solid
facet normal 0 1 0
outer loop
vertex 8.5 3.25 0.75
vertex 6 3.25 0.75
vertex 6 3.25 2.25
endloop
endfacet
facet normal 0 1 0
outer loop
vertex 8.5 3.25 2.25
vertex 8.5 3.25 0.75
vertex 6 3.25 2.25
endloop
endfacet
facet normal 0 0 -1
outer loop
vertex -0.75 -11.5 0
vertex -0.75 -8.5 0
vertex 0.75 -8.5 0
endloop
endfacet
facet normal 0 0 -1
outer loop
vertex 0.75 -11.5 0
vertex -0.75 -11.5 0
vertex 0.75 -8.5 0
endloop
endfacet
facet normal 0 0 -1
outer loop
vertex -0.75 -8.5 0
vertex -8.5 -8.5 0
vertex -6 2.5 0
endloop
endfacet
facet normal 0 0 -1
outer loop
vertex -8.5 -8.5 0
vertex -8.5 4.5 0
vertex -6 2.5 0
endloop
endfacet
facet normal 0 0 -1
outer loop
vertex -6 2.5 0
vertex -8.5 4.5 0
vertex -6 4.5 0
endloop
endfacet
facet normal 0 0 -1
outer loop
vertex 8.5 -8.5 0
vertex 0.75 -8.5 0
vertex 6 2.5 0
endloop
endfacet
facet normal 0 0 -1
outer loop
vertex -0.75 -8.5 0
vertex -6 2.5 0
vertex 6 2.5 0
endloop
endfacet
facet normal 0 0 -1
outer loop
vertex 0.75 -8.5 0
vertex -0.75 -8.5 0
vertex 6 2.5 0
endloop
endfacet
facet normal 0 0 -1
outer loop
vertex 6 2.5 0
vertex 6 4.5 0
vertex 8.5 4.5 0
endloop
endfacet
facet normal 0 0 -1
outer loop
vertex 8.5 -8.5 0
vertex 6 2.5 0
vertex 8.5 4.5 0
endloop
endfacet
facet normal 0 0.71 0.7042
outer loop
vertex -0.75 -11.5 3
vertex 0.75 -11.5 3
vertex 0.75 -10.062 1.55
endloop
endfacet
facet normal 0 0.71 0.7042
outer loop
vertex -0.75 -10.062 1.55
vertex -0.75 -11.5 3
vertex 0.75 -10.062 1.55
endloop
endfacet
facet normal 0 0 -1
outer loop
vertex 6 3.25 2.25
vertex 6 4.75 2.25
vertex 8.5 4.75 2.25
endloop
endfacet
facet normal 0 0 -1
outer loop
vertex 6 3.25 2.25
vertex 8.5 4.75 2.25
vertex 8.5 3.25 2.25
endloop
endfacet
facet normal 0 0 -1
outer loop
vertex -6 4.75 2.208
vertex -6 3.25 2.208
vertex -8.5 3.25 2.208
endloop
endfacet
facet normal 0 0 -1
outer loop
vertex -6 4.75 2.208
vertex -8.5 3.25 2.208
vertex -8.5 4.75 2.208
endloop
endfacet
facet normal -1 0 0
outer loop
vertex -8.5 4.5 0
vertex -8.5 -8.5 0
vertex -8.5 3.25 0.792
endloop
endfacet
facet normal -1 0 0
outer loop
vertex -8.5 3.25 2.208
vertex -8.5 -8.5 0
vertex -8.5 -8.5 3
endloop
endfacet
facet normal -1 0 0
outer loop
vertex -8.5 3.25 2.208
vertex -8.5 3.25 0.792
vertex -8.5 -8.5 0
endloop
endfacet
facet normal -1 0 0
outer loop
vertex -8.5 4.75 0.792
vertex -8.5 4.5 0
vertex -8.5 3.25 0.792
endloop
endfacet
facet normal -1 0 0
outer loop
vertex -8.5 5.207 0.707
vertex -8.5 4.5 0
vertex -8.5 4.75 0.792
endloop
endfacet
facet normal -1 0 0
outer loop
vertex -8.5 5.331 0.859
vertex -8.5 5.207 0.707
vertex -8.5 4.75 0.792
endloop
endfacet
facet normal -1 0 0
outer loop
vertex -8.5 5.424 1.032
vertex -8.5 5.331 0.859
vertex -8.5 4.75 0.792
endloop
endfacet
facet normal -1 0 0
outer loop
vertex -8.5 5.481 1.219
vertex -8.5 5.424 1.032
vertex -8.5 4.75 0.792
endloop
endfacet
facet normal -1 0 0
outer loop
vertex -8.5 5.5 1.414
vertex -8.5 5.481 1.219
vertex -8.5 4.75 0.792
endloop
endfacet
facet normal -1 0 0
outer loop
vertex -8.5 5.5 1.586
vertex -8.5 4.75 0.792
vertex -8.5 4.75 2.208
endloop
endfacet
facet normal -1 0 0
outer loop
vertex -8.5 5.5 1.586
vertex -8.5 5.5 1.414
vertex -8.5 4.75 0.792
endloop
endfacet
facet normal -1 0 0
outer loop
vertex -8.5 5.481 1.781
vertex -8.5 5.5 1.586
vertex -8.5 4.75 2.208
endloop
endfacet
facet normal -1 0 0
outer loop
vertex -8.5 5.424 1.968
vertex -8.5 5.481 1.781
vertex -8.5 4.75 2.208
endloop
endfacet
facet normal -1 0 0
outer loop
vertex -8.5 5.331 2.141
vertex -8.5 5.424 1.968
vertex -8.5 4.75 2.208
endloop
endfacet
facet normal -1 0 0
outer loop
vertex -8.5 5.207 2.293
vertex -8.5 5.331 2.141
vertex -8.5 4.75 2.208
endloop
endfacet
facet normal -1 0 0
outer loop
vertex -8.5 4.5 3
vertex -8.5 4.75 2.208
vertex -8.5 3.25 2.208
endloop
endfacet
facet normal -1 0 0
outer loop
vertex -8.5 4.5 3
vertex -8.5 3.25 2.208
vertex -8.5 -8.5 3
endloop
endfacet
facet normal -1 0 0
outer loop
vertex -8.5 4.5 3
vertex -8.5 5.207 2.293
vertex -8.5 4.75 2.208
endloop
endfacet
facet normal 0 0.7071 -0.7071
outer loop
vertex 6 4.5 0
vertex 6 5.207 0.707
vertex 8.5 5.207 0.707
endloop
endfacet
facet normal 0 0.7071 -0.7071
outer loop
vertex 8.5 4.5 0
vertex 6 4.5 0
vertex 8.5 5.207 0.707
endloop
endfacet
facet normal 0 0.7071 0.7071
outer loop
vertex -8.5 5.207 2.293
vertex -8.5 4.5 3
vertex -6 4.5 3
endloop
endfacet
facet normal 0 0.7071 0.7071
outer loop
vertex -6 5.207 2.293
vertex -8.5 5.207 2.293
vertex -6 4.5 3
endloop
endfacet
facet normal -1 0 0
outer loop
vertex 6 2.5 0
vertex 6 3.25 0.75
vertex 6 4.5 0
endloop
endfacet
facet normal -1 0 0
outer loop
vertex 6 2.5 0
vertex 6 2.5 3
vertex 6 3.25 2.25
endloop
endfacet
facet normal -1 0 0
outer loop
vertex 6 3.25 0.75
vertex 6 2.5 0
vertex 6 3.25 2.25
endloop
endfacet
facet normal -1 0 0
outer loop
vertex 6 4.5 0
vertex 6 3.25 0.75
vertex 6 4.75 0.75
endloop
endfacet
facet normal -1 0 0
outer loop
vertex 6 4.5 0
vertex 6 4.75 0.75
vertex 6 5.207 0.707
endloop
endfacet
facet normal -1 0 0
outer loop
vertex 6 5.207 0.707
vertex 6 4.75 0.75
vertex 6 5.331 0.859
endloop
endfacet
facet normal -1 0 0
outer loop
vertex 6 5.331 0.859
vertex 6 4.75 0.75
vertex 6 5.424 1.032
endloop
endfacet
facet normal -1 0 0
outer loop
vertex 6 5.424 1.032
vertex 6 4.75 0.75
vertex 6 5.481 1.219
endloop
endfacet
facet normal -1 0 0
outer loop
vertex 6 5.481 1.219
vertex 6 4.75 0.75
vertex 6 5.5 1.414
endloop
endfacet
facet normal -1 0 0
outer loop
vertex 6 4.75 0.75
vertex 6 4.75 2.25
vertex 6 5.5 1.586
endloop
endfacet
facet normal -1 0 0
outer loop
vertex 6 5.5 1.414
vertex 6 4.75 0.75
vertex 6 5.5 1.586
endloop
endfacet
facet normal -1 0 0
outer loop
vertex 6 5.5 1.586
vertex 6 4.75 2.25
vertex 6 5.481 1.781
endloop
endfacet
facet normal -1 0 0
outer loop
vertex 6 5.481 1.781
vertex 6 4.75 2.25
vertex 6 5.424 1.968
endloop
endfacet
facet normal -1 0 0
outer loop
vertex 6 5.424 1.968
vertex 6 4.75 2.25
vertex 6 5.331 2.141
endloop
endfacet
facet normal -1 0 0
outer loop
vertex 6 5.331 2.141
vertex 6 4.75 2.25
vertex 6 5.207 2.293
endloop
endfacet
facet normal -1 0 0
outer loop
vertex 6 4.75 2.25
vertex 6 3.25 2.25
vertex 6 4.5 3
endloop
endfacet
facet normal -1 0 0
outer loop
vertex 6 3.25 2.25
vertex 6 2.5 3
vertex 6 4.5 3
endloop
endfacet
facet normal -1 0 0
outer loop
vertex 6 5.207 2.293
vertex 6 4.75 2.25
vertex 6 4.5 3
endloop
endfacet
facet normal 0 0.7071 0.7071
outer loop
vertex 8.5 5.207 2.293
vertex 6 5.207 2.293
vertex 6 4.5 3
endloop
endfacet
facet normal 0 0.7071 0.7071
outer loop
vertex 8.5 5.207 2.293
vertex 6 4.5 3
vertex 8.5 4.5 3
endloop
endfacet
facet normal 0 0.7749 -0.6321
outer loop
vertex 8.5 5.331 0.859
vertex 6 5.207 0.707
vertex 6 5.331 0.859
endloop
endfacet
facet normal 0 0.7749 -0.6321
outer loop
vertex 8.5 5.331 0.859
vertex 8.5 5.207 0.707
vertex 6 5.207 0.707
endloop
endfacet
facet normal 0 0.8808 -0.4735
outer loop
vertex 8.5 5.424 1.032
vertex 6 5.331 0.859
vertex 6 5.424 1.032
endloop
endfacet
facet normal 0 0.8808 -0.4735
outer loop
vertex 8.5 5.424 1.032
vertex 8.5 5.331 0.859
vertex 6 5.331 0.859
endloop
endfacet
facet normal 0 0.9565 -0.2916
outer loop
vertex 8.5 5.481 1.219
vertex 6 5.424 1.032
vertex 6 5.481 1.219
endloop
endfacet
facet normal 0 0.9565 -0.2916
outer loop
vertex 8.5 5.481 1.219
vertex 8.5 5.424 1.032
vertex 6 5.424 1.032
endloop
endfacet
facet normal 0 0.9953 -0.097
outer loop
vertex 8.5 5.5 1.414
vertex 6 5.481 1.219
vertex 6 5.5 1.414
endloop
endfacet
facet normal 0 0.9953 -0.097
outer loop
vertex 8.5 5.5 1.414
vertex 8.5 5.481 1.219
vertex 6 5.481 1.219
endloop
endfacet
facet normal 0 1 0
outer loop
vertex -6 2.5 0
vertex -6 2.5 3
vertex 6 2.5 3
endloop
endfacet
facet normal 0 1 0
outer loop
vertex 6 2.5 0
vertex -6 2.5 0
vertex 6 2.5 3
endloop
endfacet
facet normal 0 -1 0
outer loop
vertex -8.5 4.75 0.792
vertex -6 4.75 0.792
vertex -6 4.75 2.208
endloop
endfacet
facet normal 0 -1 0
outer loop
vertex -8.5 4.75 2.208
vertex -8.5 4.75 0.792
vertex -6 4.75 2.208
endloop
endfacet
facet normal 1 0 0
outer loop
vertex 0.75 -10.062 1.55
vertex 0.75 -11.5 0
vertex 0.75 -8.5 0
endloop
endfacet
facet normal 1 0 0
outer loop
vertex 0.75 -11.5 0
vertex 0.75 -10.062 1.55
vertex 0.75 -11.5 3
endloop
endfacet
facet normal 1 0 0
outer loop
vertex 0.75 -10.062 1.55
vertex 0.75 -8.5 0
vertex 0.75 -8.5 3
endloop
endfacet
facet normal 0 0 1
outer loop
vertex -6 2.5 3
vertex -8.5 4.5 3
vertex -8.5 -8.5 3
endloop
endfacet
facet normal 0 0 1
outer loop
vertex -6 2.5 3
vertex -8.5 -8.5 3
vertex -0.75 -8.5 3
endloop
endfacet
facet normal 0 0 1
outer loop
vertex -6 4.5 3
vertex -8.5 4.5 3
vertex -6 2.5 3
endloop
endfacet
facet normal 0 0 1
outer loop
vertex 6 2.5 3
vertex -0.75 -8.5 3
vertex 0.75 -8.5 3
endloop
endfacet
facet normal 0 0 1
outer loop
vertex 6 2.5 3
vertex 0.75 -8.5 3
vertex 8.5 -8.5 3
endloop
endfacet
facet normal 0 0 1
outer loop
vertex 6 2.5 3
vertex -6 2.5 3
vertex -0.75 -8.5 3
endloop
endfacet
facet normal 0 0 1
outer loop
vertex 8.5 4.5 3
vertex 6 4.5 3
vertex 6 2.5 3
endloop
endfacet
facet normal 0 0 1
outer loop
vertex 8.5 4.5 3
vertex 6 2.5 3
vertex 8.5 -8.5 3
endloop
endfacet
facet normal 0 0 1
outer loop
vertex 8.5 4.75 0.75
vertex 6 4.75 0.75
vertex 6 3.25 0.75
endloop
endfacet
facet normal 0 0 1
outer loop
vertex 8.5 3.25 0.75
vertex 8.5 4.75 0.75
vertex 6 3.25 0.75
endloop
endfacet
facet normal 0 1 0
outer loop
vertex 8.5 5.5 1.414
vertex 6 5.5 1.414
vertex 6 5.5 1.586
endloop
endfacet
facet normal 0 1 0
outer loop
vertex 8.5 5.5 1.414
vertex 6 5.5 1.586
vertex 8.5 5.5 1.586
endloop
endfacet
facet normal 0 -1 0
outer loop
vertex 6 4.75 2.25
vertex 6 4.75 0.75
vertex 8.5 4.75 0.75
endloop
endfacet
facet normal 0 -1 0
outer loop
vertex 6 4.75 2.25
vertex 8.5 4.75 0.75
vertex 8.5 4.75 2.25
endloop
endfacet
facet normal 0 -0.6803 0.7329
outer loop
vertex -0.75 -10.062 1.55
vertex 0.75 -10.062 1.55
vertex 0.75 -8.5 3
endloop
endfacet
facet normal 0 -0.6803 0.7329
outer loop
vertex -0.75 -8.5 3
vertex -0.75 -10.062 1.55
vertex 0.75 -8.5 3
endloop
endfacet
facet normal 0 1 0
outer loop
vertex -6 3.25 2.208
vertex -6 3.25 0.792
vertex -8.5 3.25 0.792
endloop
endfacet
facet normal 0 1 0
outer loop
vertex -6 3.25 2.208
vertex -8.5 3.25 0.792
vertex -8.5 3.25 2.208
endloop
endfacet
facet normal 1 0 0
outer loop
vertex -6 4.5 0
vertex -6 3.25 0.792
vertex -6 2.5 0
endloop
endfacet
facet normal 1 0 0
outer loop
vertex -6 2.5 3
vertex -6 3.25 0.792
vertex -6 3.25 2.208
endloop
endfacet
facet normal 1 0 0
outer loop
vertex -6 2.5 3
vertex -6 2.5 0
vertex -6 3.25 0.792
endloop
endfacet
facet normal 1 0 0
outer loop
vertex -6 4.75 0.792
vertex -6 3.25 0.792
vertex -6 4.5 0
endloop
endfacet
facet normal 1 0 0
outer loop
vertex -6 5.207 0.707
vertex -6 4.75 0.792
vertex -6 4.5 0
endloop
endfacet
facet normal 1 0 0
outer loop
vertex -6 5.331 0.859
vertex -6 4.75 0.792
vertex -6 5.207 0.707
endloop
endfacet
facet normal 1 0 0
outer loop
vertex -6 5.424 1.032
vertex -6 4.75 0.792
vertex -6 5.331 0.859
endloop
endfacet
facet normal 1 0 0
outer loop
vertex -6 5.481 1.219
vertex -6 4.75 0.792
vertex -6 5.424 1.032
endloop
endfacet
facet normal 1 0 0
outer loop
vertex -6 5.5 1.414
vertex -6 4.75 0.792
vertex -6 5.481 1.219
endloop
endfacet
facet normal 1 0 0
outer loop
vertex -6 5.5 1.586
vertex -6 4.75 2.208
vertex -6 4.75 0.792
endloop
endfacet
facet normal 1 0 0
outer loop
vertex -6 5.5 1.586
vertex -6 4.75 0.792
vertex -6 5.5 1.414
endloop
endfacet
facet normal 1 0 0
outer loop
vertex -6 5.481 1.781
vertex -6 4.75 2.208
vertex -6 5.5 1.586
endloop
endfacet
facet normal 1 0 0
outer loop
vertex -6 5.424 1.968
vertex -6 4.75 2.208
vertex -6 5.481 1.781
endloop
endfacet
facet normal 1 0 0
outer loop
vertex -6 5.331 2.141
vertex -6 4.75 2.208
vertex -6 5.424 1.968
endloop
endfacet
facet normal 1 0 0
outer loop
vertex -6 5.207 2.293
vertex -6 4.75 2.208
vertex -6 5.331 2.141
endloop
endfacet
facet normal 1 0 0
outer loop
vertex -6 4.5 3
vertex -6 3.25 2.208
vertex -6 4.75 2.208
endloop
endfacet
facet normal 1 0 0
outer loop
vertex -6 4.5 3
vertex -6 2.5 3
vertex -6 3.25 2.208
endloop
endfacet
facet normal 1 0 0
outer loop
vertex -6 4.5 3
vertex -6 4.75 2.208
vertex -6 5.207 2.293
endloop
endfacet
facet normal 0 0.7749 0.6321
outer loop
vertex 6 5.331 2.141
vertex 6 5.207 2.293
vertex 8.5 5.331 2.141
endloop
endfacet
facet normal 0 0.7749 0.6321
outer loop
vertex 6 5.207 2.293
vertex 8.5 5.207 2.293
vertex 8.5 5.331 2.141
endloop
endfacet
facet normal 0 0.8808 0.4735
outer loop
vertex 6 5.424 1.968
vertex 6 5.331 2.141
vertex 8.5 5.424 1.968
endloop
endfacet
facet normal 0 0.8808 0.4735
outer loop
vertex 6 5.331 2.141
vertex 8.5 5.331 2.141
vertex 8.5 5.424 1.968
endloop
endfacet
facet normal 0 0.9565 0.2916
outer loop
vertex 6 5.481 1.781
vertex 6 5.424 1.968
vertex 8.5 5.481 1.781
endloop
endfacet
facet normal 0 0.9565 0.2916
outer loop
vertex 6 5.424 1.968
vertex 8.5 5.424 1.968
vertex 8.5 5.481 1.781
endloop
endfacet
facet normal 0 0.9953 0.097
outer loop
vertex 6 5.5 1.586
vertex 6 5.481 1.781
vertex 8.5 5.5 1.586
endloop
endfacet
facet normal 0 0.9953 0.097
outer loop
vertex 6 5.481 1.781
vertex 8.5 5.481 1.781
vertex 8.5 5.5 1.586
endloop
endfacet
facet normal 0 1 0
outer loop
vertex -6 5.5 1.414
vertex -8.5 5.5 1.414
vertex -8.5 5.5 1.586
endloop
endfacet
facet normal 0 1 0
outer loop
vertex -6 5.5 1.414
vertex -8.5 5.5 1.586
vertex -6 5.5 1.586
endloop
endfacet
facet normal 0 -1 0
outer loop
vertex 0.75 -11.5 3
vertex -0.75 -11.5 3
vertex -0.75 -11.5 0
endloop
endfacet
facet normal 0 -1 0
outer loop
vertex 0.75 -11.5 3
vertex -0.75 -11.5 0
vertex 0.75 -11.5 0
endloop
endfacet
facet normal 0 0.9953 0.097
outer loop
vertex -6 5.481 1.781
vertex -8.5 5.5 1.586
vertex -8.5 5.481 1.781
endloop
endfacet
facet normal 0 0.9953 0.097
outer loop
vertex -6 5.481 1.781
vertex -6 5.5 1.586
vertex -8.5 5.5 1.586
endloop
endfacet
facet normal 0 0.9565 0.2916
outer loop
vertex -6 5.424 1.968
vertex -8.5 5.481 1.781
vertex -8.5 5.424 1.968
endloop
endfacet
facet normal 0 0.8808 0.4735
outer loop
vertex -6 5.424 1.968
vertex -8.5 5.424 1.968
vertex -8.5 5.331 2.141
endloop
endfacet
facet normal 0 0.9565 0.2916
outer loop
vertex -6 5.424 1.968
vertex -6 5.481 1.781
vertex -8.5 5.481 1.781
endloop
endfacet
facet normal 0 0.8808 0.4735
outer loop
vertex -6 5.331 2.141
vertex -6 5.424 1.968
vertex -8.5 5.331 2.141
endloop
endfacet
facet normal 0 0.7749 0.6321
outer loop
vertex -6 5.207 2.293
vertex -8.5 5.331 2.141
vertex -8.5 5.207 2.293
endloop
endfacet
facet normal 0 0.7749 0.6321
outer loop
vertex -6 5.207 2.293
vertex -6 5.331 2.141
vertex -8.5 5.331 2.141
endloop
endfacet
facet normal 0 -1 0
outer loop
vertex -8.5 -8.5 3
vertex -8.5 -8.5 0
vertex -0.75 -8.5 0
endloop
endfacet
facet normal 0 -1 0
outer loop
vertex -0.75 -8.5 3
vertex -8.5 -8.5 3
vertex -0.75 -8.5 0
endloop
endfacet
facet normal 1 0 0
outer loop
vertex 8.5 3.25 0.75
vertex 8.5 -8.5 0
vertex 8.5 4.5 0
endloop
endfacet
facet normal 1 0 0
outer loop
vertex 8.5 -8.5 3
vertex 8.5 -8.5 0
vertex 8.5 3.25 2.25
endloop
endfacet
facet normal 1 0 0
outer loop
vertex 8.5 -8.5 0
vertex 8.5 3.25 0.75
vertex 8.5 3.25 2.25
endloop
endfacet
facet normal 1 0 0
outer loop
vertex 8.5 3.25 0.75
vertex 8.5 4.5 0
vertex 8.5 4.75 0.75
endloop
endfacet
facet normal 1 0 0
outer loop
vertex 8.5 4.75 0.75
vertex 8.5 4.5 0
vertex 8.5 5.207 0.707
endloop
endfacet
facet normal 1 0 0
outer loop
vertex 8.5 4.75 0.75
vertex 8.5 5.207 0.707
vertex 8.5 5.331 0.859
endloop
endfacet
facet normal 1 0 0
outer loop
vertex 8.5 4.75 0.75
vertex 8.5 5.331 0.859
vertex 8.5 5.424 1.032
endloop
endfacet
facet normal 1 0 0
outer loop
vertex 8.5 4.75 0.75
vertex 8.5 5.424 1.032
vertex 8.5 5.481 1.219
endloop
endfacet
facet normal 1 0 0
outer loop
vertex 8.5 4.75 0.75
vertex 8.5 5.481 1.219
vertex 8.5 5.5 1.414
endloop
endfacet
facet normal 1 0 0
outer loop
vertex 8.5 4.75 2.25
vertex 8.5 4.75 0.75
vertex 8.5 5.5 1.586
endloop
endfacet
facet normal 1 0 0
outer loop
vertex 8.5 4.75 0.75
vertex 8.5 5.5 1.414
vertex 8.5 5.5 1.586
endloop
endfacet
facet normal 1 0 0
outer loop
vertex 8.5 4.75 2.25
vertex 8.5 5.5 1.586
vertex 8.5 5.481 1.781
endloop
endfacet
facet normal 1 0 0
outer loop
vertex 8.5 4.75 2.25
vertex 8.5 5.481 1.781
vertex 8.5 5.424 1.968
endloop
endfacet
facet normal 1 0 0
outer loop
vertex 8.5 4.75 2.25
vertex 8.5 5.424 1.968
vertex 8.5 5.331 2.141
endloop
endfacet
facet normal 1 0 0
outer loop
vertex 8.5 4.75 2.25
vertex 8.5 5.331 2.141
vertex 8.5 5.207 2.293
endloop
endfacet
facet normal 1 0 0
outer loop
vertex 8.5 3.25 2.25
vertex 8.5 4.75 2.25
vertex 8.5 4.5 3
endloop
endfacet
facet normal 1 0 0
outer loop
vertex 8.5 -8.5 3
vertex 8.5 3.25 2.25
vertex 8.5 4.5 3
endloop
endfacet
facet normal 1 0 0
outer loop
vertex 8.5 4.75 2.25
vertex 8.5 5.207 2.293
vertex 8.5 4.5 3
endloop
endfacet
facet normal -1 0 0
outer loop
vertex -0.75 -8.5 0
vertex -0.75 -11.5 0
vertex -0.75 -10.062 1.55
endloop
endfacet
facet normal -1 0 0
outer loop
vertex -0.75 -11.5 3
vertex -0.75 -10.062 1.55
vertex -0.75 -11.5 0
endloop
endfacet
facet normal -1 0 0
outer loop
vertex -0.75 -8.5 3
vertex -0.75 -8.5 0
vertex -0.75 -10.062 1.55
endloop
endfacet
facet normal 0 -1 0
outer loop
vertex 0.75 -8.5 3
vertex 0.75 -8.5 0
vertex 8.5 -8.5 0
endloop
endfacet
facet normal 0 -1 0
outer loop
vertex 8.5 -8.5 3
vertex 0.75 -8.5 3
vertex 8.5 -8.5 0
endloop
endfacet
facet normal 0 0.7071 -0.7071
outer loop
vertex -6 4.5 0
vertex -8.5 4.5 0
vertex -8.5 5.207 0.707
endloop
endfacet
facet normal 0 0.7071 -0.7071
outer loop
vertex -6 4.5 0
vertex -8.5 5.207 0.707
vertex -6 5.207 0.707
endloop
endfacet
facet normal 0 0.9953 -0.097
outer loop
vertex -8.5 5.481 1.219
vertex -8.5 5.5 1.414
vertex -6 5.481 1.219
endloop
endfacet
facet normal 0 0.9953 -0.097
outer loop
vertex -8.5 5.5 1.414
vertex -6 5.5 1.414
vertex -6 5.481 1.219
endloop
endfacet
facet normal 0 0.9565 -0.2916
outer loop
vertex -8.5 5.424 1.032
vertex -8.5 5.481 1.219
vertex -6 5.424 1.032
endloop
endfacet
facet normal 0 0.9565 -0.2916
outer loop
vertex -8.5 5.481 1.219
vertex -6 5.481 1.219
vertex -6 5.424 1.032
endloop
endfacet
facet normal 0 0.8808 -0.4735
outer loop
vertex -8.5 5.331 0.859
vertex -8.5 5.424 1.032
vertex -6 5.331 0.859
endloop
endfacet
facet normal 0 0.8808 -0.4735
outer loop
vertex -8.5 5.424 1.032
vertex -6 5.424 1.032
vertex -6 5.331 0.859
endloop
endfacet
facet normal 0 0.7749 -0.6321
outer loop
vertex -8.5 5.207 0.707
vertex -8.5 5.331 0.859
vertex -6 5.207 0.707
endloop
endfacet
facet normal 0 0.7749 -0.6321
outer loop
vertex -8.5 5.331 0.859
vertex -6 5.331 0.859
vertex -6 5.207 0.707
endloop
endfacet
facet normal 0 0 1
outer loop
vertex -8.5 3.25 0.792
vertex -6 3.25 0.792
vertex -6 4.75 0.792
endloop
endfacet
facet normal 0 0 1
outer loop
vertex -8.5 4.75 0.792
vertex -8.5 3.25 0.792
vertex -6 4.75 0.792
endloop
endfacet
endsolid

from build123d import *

# Parameters (mm, degrees)
F0_W      = 17
F0_H      = 11
F1_DEPTH  = 3
F2_W      = 12
F2_H      = 3
F3_DEPTH  = 3.001
F4_W      = 1.5
F4_H      = 1.5
F5_DEPTH  = 100
F6_SIZE   = 1
F7_SIZE   = 1
F8_R      = 1
F9_DEPTH  = 3
F10_W     = 1.5
F10_H     = 3
F11_DEPTH = 3
F13_DEPTH = 9.251
F14_W     = 1.5
F14_H     = 1.416422517
F15_DEPTH = 25


with BuildPart() as f1:
    # F0 (on Top) → F1 (new body)
    with BuildSketch(Plane.XY):
        Rectangle(F0_W, F0_H)
    extrude(amount=F1_DEPTH)

    # F2 (on face) → F3 (cut, through all)
    with BuildSketch(Plane.XY.offset(3)):
        with Locations((0, 4)):
            Rectangle(F2_W, F2_H)
    extrude(amount=-F3_DEPTH, mode=Mode.SUBTRACT)

    # F4 (on face) → F5 (cut)
    with BuildSketch(Plane(origin=(6, 0, 0), x_dir=(0, -1, 0), z_dir=(-1, 0, 0))):
        with Locations((-4, 1.5)):
            Rectangle(F4_W, F4_H)
    extrude(amount=-F5_DEPTH, mode=Mode.SUBTRACT)

    # F6
    f6_edges = [f1.edges().sort_by_distance(p)[0] for p in [
        (-7.25, 5.5, 3),
        (7.25, 5.5, 3),
    ]]
    chamfer(f6_edges, length=F6_SIZE)

    # F7
    f7_edges = [f1.edges().sort_by_distance(p)[0] for p in [
        (-7.25, 5.5, 0),
        (7.25, 5.5, 0),
    ]]
    chamfer(f7_edges, length=F7_SIZE)

    # F8
    f8_edges = [f1.edges().sort_by_distance(p)[0] for p in [
        (-7.25, 5.5, 2),
        (7.25, 5.5, 2),
        (-7.25, 5.5, 1),
        (7.25, 5.5, 1),
    ]]
    fillet(f8_edges, radius=F8_R)

    # F9 (add): a face of the model
    f9_faces = [f1.faces().sort_by_distance(p)[0] for p in [
        (0, -5.5, 1.5),
    ]]
    extrude(f9_faces, amount=F9_DEPTH)

    # F10 (on face) → F11 (join)
    with BuildSketch(Plane.XZ.offset(8.5)):
        with Locations((0, 1.5)):
            Rectangle(F10_W, F10_H)
    extrude(amount=F11_DEPTH)

    # F12 (on face) → F13 (cut, through all)
    with BuildSketch(Plane.YZ.offset(0.75)):
        Polygon((-8.5, 3), (-11.5, 3), (-10.0618377328, 1.5503217001), align=None)
    extrude(amount=-F13_DEPTH, mode=Mode.SUBTRACT)

    # F14 (on face) → F15 (cut)
    with BuildSketch(Plane.YZ.offset(-6)):
        with Locations((4, 1.5)):
            Rectangle(F14_W, F14_H)
    extrude(amount=-F15_DEPTH, mode=Mode.SUBTRACT)


solid = f1.part
